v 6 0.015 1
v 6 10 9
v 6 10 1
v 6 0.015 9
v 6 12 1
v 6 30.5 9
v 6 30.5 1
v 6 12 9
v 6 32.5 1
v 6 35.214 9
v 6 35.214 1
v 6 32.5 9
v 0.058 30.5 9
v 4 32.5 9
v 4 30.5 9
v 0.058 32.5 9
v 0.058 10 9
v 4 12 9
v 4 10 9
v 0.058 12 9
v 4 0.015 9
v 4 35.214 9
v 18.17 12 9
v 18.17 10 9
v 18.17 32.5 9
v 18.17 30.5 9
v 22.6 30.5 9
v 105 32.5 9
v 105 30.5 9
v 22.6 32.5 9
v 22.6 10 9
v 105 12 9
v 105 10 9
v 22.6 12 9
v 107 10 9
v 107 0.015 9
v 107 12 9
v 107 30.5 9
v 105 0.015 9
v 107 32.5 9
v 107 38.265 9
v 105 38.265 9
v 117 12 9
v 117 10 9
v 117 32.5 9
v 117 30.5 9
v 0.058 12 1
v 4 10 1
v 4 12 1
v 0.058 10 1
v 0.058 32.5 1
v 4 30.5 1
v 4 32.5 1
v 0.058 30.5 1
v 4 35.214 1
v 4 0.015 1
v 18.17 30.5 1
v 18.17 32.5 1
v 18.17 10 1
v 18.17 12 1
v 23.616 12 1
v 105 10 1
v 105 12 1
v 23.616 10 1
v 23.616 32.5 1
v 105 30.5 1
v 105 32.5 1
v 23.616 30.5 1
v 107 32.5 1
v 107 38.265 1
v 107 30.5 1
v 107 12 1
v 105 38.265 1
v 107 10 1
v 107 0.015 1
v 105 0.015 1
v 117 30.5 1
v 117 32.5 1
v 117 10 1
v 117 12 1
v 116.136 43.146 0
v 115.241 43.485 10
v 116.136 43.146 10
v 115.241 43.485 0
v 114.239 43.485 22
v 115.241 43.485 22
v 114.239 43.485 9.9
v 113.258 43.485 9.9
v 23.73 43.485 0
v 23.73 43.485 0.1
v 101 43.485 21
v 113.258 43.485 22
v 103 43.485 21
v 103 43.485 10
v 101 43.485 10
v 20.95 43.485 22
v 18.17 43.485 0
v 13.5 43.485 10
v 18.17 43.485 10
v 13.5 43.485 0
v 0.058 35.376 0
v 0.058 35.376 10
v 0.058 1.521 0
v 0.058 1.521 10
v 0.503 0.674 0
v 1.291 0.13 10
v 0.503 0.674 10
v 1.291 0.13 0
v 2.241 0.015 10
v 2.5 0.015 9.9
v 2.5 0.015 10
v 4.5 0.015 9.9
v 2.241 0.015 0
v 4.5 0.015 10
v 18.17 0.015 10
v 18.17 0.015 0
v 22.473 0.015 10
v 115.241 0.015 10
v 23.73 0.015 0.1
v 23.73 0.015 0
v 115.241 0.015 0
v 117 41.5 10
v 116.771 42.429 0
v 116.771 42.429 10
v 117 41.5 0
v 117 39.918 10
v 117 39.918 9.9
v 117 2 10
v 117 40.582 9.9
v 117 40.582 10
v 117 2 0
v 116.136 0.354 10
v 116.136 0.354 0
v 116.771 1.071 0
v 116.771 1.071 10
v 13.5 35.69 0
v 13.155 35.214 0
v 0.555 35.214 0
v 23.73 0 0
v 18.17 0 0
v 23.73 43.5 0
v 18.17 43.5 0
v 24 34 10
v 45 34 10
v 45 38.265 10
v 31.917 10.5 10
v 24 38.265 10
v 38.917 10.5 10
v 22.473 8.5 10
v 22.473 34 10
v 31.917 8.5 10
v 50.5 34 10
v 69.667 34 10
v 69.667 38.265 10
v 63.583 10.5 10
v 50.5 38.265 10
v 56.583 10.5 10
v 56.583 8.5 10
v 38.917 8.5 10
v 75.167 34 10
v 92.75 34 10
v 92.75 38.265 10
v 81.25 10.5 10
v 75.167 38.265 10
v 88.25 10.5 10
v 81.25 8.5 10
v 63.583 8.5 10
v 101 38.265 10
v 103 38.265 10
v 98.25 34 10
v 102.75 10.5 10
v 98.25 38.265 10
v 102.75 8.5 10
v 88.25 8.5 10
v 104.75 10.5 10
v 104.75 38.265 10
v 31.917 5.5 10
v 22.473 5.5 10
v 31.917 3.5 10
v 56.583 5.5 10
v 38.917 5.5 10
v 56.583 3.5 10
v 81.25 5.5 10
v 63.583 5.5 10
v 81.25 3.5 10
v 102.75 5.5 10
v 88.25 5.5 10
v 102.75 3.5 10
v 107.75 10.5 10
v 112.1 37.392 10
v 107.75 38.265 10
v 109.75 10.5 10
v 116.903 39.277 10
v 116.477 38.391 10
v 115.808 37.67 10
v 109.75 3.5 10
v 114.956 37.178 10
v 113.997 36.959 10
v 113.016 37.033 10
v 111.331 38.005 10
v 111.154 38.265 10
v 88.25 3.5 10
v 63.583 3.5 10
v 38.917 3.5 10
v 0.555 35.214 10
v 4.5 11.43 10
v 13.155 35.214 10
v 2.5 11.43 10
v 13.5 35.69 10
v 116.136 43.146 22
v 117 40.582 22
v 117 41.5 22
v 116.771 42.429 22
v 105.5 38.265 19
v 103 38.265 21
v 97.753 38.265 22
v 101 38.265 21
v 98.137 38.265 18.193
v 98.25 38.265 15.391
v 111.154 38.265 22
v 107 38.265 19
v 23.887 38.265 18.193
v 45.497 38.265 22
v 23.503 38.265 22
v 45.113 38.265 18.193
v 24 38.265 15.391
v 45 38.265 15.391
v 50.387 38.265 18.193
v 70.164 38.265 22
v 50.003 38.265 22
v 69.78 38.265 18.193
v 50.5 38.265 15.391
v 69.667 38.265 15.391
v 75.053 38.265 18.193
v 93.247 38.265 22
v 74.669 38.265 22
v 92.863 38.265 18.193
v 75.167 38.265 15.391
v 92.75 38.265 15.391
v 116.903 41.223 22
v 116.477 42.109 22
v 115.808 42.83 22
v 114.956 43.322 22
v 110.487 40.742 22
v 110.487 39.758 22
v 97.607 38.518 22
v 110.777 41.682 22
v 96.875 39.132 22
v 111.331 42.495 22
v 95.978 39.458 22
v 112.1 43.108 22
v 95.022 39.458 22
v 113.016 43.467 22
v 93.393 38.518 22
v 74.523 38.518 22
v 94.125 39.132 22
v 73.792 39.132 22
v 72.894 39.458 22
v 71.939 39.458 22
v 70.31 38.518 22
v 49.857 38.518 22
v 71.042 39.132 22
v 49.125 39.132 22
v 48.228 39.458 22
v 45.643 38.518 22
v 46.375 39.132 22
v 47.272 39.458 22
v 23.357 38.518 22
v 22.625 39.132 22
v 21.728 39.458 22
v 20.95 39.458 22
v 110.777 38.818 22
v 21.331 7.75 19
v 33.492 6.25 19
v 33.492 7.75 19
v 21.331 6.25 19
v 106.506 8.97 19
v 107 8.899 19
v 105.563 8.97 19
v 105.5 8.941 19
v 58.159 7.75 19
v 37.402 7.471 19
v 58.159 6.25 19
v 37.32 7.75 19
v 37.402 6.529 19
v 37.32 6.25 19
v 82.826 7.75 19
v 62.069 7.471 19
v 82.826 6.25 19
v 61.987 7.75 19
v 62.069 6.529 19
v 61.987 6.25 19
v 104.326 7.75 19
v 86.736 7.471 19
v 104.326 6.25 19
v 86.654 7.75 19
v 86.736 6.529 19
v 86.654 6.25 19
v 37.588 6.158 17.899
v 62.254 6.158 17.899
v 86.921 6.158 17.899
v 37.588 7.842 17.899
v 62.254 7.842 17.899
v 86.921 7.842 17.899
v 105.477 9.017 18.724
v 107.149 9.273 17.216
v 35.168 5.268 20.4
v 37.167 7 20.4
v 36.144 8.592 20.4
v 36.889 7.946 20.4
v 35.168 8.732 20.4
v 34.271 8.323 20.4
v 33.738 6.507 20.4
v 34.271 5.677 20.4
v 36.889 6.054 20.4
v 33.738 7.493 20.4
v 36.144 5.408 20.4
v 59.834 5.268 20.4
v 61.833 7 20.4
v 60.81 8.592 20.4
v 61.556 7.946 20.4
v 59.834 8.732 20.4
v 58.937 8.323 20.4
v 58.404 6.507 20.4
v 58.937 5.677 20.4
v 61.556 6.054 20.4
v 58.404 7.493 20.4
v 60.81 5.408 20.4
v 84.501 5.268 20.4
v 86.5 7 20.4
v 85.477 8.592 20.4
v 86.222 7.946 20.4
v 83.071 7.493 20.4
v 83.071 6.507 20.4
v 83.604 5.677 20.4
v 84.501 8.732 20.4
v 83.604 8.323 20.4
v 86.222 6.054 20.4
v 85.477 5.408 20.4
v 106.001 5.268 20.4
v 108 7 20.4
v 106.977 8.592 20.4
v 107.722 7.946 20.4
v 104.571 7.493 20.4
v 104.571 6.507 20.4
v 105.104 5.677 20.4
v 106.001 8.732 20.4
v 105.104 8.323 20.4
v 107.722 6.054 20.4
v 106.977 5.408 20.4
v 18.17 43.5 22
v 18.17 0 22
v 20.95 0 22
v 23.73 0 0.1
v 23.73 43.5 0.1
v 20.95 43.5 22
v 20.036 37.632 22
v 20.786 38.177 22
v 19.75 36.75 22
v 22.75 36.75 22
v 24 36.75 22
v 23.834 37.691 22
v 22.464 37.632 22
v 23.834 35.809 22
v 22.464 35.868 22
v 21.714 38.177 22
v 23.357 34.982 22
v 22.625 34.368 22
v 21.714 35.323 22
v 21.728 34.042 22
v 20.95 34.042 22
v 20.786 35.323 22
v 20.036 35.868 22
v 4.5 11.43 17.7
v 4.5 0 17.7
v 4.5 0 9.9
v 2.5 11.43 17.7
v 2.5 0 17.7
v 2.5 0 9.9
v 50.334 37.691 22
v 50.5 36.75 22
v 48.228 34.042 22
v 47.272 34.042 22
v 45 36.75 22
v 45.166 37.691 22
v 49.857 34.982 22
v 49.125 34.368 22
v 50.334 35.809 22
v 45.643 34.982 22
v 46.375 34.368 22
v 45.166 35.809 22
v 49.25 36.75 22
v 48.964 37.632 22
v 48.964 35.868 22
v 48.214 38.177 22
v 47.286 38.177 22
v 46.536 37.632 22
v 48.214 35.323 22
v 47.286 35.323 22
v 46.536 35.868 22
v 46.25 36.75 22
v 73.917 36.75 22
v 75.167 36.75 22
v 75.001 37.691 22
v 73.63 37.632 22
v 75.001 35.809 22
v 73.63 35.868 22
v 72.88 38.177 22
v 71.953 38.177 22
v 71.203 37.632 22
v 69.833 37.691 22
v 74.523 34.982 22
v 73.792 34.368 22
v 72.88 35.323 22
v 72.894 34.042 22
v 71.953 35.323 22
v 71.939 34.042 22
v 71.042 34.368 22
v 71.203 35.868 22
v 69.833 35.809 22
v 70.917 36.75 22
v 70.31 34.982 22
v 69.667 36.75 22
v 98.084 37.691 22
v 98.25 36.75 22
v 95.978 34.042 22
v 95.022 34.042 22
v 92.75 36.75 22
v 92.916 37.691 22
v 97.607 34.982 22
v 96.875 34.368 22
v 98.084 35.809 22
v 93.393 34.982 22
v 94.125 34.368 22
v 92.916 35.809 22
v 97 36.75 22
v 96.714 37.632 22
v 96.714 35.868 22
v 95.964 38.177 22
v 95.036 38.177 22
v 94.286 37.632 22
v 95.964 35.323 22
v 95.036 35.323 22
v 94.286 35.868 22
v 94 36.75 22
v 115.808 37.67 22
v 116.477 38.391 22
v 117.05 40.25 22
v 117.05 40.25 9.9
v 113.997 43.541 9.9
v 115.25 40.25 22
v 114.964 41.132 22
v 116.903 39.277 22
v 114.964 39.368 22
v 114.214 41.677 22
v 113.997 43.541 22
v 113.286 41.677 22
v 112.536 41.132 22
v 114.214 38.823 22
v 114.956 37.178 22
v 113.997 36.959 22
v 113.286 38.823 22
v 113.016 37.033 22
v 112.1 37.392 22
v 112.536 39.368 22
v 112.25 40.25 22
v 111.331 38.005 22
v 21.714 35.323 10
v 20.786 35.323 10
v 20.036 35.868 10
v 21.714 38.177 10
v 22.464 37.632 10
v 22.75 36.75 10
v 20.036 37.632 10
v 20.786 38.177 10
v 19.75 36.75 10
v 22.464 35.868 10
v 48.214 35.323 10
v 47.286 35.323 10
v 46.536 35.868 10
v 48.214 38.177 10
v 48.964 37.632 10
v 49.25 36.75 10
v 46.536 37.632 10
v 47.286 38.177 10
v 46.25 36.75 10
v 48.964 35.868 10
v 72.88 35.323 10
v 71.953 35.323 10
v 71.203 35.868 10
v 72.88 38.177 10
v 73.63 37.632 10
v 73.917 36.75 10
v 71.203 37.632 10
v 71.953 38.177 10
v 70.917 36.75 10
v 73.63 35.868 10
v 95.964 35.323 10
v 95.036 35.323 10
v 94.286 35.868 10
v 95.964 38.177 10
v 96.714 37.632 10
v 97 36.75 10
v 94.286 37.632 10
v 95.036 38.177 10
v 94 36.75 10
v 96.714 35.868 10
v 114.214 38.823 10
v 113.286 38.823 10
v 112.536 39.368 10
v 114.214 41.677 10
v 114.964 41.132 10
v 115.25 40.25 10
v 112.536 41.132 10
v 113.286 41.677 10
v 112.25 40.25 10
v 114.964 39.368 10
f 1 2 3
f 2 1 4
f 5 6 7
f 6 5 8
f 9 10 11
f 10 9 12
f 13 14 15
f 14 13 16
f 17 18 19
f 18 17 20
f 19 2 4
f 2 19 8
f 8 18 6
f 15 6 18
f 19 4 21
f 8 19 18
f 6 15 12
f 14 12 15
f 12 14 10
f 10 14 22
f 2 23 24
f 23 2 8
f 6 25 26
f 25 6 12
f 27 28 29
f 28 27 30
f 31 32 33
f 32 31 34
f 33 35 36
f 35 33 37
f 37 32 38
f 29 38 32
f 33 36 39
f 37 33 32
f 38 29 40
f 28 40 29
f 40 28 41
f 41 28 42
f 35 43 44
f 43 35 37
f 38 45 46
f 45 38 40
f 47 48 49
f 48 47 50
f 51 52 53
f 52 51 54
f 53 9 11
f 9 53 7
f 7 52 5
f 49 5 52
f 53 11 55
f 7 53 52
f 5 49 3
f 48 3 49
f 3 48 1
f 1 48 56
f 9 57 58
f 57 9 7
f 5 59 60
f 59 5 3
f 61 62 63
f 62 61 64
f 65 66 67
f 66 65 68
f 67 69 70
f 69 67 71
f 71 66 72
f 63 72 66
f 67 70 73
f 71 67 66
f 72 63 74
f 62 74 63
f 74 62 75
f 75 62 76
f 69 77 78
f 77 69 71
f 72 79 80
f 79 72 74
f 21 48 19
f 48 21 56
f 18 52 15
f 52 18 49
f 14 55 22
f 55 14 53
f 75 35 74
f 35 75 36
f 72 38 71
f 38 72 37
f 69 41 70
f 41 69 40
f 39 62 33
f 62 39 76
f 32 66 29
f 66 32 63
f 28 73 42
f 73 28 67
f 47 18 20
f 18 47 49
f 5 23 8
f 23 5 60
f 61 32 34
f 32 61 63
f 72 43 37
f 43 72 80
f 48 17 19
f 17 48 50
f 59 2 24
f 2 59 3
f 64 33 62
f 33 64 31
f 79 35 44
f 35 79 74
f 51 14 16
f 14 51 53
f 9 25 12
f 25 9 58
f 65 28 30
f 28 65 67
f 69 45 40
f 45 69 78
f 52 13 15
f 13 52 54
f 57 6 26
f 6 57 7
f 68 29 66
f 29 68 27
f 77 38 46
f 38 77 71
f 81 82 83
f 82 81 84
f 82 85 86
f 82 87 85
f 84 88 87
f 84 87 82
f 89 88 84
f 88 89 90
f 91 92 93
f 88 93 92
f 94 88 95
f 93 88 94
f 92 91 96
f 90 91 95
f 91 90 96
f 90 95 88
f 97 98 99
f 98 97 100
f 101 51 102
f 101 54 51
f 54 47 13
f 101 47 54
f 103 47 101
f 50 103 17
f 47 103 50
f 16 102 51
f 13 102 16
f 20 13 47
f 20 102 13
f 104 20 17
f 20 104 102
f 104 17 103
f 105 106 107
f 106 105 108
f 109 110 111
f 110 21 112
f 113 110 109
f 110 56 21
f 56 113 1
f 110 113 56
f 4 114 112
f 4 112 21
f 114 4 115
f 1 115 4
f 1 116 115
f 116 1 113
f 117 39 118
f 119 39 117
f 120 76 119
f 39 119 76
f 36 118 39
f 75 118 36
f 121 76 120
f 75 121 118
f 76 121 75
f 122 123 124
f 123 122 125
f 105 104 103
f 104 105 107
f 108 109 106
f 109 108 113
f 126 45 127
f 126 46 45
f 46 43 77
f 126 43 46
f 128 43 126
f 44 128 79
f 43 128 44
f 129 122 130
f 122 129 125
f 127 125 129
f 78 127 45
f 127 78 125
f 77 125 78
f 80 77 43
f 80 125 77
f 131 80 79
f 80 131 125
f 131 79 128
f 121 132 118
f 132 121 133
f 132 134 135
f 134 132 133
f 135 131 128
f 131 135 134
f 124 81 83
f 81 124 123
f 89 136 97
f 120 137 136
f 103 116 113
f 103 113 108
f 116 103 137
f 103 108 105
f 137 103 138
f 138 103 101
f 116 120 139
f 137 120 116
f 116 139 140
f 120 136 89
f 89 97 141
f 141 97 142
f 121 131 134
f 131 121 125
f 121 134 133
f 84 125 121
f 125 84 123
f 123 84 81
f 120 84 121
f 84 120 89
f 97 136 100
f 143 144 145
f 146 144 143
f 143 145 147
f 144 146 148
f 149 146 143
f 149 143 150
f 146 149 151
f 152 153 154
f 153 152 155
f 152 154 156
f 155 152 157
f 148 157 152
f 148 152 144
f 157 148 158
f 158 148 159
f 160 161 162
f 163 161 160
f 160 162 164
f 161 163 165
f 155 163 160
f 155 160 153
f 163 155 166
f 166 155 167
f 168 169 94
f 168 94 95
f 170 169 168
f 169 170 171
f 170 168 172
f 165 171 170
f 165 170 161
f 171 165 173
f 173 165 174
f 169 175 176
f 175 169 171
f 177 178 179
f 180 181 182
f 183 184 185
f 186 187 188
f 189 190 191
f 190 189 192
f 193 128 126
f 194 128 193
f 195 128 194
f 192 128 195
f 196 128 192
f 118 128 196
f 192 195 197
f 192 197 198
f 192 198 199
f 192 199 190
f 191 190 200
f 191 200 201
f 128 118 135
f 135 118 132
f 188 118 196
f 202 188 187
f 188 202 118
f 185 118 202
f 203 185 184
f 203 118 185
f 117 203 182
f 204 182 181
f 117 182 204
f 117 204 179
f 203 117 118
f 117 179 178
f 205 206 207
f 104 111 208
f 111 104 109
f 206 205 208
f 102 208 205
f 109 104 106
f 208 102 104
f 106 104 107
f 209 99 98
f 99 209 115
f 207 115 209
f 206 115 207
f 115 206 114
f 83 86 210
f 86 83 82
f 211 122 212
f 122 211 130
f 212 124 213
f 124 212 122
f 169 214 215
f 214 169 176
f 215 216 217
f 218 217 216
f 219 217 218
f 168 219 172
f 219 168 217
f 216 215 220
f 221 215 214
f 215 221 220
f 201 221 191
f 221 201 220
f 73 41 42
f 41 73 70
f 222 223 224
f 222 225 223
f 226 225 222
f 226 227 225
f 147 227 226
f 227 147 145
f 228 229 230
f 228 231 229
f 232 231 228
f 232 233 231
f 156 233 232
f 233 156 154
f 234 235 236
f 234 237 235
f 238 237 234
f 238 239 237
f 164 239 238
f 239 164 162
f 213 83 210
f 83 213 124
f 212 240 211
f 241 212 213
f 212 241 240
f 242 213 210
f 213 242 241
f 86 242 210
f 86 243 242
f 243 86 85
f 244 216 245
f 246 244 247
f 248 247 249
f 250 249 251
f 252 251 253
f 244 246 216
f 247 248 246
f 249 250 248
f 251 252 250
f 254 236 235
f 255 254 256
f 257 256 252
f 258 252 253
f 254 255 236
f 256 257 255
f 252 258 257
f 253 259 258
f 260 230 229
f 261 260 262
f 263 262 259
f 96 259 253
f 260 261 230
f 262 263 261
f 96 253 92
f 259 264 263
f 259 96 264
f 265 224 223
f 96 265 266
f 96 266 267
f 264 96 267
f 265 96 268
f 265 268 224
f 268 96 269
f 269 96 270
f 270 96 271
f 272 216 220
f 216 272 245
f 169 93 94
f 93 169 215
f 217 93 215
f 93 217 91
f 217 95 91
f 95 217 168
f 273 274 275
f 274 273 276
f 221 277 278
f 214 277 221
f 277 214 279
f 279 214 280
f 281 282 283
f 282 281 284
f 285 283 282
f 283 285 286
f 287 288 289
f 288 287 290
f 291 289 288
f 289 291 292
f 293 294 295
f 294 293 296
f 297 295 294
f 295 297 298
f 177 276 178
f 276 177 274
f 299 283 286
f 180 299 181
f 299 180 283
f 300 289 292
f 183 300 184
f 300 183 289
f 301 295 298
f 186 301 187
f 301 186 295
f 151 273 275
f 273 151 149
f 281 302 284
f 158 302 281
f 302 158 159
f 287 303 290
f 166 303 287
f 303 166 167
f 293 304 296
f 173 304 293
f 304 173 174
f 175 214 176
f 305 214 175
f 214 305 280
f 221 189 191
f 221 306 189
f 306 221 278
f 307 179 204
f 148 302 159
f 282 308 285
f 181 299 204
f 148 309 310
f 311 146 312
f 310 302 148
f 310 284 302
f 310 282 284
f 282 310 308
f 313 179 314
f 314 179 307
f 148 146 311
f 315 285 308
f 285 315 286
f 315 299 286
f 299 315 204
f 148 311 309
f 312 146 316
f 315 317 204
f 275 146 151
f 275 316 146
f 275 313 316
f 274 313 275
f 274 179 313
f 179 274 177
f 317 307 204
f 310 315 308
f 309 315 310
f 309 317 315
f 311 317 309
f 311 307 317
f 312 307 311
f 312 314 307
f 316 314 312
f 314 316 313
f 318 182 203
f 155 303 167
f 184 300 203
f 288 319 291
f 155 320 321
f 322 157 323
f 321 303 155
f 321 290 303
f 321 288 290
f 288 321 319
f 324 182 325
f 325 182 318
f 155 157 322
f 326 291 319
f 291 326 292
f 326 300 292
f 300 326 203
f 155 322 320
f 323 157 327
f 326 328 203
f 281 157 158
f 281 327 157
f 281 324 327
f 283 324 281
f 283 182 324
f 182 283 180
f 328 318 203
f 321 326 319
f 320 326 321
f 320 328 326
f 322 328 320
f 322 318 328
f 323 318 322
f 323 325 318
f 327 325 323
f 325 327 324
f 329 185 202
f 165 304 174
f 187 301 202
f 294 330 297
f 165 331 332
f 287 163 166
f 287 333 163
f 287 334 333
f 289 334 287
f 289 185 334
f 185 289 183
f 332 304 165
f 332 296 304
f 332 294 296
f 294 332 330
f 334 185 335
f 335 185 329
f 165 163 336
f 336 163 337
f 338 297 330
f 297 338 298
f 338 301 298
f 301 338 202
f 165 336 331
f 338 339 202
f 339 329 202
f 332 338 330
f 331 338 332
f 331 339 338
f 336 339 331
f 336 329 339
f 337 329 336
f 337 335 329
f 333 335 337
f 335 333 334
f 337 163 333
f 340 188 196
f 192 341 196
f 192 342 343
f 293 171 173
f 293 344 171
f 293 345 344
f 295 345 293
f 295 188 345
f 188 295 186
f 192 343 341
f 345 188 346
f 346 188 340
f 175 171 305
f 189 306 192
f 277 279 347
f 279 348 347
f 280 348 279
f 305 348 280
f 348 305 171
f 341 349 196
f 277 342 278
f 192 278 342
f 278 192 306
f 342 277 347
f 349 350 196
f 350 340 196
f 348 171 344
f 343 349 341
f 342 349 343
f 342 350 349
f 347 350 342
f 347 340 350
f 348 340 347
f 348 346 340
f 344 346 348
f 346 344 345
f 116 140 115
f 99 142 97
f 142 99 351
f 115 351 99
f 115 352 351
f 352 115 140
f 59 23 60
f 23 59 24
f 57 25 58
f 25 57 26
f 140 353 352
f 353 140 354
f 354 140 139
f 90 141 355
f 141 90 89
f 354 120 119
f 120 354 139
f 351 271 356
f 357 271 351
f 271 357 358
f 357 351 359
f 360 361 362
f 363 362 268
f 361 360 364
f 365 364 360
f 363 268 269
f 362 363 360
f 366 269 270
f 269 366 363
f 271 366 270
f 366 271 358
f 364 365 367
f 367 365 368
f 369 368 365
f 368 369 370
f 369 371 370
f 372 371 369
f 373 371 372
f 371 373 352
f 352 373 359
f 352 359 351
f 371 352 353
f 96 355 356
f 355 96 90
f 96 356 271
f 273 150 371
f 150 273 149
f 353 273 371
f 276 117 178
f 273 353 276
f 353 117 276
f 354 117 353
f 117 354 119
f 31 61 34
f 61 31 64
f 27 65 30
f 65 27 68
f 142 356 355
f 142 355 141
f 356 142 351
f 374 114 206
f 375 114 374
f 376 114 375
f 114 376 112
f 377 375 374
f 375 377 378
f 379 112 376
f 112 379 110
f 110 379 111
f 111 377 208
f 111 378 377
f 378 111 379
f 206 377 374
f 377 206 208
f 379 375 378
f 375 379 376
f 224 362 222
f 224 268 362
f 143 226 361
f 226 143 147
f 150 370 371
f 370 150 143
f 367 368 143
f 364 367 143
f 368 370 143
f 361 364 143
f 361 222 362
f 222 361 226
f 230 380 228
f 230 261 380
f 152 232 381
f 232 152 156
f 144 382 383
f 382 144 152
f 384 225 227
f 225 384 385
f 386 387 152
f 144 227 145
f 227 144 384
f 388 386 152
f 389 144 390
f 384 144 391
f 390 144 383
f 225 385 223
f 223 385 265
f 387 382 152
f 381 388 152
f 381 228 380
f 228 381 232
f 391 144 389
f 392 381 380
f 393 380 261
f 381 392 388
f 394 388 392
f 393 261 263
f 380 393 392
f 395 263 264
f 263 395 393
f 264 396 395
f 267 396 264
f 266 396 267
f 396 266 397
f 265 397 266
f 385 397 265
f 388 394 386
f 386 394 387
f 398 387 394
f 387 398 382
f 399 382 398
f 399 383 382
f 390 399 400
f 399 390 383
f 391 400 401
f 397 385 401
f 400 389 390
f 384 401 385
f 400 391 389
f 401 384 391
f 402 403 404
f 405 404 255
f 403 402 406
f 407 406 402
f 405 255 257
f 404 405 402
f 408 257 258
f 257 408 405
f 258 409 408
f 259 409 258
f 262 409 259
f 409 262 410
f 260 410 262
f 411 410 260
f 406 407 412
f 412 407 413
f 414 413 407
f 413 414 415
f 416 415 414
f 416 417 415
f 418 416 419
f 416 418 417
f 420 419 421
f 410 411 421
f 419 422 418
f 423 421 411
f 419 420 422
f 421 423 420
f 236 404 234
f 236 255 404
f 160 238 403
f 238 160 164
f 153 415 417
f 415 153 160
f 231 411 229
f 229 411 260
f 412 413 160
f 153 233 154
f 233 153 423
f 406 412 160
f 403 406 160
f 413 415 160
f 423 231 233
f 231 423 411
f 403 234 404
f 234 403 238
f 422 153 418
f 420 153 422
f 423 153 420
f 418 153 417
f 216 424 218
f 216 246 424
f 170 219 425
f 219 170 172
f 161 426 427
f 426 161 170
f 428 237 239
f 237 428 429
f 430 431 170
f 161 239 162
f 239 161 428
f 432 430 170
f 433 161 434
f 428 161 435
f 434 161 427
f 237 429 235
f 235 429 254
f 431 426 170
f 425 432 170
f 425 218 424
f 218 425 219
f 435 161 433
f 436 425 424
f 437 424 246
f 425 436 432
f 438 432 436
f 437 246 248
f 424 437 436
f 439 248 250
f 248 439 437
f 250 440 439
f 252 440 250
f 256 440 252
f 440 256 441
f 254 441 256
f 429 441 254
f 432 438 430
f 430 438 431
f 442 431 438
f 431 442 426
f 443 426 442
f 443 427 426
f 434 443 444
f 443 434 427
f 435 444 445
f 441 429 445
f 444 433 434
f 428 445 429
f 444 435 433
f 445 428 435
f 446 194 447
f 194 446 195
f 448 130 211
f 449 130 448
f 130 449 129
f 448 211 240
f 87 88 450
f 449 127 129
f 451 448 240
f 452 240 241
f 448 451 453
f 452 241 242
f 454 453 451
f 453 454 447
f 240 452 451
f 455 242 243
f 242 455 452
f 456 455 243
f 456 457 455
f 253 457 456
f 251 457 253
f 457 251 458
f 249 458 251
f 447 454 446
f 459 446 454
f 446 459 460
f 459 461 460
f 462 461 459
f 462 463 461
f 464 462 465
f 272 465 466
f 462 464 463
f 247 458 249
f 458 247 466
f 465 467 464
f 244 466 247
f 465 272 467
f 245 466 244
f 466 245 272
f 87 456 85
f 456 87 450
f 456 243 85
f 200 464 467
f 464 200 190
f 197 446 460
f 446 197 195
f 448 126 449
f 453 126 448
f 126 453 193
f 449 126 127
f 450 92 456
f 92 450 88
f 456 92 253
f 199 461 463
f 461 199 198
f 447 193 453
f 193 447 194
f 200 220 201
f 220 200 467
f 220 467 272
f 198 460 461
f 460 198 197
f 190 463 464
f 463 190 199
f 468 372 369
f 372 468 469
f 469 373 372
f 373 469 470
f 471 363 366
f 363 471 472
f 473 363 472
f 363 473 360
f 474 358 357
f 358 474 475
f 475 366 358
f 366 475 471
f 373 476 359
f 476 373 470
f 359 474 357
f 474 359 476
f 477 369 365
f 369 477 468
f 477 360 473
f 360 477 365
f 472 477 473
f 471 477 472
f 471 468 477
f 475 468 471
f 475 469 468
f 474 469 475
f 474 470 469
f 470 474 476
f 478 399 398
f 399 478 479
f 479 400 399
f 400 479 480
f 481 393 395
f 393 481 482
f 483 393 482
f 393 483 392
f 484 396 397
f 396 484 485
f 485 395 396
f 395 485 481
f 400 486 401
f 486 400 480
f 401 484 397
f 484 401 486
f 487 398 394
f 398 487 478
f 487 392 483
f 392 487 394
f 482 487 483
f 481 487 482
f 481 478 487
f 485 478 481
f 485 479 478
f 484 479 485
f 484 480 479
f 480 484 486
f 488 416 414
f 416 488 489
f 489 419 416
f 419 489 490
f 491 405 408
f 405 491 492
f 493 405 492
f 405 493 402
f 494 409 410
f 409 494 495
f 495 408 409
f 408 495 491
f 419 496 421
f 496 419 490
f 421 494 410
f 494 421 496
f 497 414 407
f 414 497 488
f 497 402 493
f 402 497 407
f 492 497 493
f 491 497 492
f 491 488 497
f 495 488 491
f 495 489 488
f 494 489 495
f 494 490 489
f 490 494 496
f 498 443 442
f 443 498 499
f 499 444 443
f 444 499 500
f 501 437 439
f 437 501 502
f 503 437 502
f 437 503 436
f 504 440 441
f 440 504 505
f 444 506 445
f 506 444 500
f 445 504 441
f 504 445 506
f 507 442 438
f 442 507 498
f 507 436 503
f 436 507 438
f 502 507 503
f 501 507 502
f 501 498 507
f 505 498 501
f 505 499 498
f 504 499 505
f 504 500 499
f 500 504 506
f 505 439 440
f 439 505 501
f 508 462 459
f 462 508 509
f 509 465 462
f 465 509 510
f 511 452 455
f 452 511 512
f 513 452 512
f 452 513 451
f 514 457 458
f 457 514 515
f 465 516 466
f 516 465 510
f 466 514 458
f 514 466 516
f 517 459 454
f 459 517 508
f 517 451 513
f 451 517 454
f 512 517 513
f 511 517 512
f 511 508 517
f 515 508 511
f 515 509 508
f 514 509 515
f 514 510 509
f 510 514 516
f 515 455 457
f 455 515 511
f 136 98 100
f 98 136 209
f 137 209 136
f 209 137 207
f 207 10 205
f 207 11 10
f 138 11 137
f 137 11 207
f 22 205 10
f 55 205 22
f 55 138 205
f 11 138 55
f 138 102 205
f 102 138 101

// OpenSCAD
hq = true;
clr = 0.2;

$fs = hq ? 1 : 4;
$fa = hq ? 1 : 4;
eps = 0.1;

// Constants from the Eagle file

// Board dimensions
board_x = 0;
board_y = 0;
board_w = 117;
board_h = 43.5;
board_r = 2;

// Teensy location
teensy_cx =  9.08;
teensy_cy = 19.05;
teensy_w =  7 * 2.54;
teensy_h = 14 * 2.54;
teensy_paddle_w = 20.75;

// Tactile switches
sw1_x = 35.416665625;
sw1_y = 7;
sw2_x = 60.083334375;
sw2_y = 7;
sw3_x = 84.75;
sw3_y = 7;
sw4_x = 106.25;
sw4_y = 7;
swlast_x = sw4_x;
sw_d = 2.5;

// Screw holes
hole1_x = 21.25;
hole1_y = 36.75;

hole2_x = 47.75;
hole2_y = 36.75;

hole3_x = 72.416665625;
hole3_y = 36.75;

hole4_x = 95.5;
hole4_y = 36.75;

hole5_x = 113.75;
hole5_y = 40.25;

hole_d = 3;
hole_clr = 0;

// Paddles
paddle_y = 3.5;

// Spine
spine_y = 38.25;
spine_cx2 = (37.25 + 48.5) / 2;
spine_cx3 = (58.75 + 66.72) / 2;

// Header
header_cx = 7.79;
header_cy = 39.73;
header_w = 3 * 2.54;
header_h = 2 * 2.54;

// End Eagle constants

teensy_rx = teensy_cx + teensy_w / 2; // Teensy right side x coord.

// Z heights
base_z = 1 + 7 + 2;
deck_z = base_z + 9 + 3;
sw_z = deck_z - 1.6;
teensy_z = deck_z - 4.1;
bulkhead_z = deck_z - 3;

module centered_cube(size, zt=0) {
    translate([-size[0] / 2, -size[1] / 2, zt])
        cube(size);
}

module round_rect(size, r) {
    hull()
        for (x = [r, size[0] - r]) for ( y = [r, size[1] - r]) {
            translate([x, y, 0])
                cylinder(r=r, h=size[2]);
        }
}


module base() {
    difference() {
        round_rect([board_w, board_h, base_z], board_r);
        for (x = [4, 20, board_w - 12])
            translate([x, -eps, 1])
                cube([2, board_h + 2 * eps, base_z - 2]);
        for (y = [10, board_h - 13])
            translate([-eps, y, 1])
                cube([board_w + 2 * eps, 2, base_z - 2]);
    }
}

module spine() {
    lx = teensy_rx + clr;
    difference() {
        translate([lx, spine_y, eps])
            round_rect([board_w - lx, board_h - spine_y, deck_z - eps],
                       r=board_r);
        // strain relief
        translate([board_w - 16, spine_y - eps, base_z])
            cube([2, board_h, deck_z - base_z - 1]);
    }
}

module bulkheads() {
    bt0 = 3;
    bt1 = 1.5;
    bx = teensy_rx + clr;
    by = sw1_y;
    bw = swlast_x - bx;
    bh = board_h - by;
    translate([bx + eps, by, 0])
        hull() {
            translate([0, -bt0/2, base_z - eps])
                cube([bw + bt0/2, bt0, eps]);
            translate([0, -bt1/2, bulkhead_z - eps])
                cube([bw + bt1/2, bt1, eps]);
        }
    translate([bx + bw, board_h, 0])
        rotate(-90)
            hull() {
                translate([eps, -bt0/2, base_z - eps])
                    cube([bh + bt0/2 - eps, bt0, eps]);
                translate([eps, -bt1/2, bulkhead_z - eps])
                    cube([bh + bt1/2 - eps, bt1, eps]);
            }
}

module screw_support(x, y, z) {
    support_d = hole_d + 2.5;
    hull() {
        translate([x, y, base_z - eps])
            centered_cube([support_d, support_d, eps]);
        translate([x, y, z - eps])
            cylinder(d=support_d, h = eps);
    }
}

module end_screw_support(x, y ,z) {
    support_d = 6.6;
    translate([x, y, base_z - eps])
        cylinder(d = support_d, h = z - base_z + eps);
}

module screw_supports() {
    screw_support(hole1_x, hole1_y, deck_z);
    screw_support(hole2_x, hole2_y, deck_z);
    screw_support(hole3_x, hole3_y, deck_z);
    screw_support(hole4_x, hole4_y, deck_z);
    end_screw_support(hole5_x, hole5_y, deck_z);
}

module screw_hole(x, y, z) {
    translate([x, y, z])
        cylinder(d=hole_d + hole_clr, h=deck_z + 3);
}

module screw_holes() {
    screw_hole(hole1_x, hole1_y, base_z);
    screw_hole(hole2_x, hole2_y, base_z);
    screw_hole(hole3_x, hole3_y, base_z);
    screw_hole(hole4_x, hole4_y, base_z);
    screw_hole(hole5_x, hole5_y, base_z);
}

module switch_pillars() {
    module switch_pillar(x, y) {
        mbh = 2 * (y - paddle_y);
        mbw = mbh;
        translate([x, y, 0])
            hull() {
                centered_cube([mbw, mbh, eps], zt=base_z - eps);
                translate([0, 0, sw_z - eps])
                    cylinder(d=sw_d + 1, h=eps);
            }
    }
    switch_pillar(sw1_x, sw1_y);
    switch_pillar(sw2_x, sw2_y);
    switch_pillar(sw3_x, sw3_y);
    switch_pillar(sw4_x, sw4_y);
}

module under_teensy() {
    uw = teensy_paddle_w - teensy_rx;
    translate([teensy_rx + clr, 0, 0])
        hull() {
            cube([2 * uw, board_h, eps]);
            translate([0, 0, deck_z - eps])
                cube([uw, board_h, eps]);
        }
    translate([2.5, 0, base_z - eps])
        cube([2, 4.5 * 2.54, teensy_z - base_z - eps]);
}

module header_cutout() {
    hdr_clr = 2;
    translate([-eps, header_cy - header_h / 2 - hdr_clr, -eps])
        round_rect([header_cx + header_w / 2 + hdr_clr,
                    board_h,
                    deck_z + 2 * eps],
                   r=0.5);
}

module substrate() {
    difference() {
        union() {
            base();
            spine();
            bulkheads();
            switch_pillars();
            under_teensy();
            screw_supports();
        };
        screw_holes();
        header_cutout();
    };
}

substrate();
